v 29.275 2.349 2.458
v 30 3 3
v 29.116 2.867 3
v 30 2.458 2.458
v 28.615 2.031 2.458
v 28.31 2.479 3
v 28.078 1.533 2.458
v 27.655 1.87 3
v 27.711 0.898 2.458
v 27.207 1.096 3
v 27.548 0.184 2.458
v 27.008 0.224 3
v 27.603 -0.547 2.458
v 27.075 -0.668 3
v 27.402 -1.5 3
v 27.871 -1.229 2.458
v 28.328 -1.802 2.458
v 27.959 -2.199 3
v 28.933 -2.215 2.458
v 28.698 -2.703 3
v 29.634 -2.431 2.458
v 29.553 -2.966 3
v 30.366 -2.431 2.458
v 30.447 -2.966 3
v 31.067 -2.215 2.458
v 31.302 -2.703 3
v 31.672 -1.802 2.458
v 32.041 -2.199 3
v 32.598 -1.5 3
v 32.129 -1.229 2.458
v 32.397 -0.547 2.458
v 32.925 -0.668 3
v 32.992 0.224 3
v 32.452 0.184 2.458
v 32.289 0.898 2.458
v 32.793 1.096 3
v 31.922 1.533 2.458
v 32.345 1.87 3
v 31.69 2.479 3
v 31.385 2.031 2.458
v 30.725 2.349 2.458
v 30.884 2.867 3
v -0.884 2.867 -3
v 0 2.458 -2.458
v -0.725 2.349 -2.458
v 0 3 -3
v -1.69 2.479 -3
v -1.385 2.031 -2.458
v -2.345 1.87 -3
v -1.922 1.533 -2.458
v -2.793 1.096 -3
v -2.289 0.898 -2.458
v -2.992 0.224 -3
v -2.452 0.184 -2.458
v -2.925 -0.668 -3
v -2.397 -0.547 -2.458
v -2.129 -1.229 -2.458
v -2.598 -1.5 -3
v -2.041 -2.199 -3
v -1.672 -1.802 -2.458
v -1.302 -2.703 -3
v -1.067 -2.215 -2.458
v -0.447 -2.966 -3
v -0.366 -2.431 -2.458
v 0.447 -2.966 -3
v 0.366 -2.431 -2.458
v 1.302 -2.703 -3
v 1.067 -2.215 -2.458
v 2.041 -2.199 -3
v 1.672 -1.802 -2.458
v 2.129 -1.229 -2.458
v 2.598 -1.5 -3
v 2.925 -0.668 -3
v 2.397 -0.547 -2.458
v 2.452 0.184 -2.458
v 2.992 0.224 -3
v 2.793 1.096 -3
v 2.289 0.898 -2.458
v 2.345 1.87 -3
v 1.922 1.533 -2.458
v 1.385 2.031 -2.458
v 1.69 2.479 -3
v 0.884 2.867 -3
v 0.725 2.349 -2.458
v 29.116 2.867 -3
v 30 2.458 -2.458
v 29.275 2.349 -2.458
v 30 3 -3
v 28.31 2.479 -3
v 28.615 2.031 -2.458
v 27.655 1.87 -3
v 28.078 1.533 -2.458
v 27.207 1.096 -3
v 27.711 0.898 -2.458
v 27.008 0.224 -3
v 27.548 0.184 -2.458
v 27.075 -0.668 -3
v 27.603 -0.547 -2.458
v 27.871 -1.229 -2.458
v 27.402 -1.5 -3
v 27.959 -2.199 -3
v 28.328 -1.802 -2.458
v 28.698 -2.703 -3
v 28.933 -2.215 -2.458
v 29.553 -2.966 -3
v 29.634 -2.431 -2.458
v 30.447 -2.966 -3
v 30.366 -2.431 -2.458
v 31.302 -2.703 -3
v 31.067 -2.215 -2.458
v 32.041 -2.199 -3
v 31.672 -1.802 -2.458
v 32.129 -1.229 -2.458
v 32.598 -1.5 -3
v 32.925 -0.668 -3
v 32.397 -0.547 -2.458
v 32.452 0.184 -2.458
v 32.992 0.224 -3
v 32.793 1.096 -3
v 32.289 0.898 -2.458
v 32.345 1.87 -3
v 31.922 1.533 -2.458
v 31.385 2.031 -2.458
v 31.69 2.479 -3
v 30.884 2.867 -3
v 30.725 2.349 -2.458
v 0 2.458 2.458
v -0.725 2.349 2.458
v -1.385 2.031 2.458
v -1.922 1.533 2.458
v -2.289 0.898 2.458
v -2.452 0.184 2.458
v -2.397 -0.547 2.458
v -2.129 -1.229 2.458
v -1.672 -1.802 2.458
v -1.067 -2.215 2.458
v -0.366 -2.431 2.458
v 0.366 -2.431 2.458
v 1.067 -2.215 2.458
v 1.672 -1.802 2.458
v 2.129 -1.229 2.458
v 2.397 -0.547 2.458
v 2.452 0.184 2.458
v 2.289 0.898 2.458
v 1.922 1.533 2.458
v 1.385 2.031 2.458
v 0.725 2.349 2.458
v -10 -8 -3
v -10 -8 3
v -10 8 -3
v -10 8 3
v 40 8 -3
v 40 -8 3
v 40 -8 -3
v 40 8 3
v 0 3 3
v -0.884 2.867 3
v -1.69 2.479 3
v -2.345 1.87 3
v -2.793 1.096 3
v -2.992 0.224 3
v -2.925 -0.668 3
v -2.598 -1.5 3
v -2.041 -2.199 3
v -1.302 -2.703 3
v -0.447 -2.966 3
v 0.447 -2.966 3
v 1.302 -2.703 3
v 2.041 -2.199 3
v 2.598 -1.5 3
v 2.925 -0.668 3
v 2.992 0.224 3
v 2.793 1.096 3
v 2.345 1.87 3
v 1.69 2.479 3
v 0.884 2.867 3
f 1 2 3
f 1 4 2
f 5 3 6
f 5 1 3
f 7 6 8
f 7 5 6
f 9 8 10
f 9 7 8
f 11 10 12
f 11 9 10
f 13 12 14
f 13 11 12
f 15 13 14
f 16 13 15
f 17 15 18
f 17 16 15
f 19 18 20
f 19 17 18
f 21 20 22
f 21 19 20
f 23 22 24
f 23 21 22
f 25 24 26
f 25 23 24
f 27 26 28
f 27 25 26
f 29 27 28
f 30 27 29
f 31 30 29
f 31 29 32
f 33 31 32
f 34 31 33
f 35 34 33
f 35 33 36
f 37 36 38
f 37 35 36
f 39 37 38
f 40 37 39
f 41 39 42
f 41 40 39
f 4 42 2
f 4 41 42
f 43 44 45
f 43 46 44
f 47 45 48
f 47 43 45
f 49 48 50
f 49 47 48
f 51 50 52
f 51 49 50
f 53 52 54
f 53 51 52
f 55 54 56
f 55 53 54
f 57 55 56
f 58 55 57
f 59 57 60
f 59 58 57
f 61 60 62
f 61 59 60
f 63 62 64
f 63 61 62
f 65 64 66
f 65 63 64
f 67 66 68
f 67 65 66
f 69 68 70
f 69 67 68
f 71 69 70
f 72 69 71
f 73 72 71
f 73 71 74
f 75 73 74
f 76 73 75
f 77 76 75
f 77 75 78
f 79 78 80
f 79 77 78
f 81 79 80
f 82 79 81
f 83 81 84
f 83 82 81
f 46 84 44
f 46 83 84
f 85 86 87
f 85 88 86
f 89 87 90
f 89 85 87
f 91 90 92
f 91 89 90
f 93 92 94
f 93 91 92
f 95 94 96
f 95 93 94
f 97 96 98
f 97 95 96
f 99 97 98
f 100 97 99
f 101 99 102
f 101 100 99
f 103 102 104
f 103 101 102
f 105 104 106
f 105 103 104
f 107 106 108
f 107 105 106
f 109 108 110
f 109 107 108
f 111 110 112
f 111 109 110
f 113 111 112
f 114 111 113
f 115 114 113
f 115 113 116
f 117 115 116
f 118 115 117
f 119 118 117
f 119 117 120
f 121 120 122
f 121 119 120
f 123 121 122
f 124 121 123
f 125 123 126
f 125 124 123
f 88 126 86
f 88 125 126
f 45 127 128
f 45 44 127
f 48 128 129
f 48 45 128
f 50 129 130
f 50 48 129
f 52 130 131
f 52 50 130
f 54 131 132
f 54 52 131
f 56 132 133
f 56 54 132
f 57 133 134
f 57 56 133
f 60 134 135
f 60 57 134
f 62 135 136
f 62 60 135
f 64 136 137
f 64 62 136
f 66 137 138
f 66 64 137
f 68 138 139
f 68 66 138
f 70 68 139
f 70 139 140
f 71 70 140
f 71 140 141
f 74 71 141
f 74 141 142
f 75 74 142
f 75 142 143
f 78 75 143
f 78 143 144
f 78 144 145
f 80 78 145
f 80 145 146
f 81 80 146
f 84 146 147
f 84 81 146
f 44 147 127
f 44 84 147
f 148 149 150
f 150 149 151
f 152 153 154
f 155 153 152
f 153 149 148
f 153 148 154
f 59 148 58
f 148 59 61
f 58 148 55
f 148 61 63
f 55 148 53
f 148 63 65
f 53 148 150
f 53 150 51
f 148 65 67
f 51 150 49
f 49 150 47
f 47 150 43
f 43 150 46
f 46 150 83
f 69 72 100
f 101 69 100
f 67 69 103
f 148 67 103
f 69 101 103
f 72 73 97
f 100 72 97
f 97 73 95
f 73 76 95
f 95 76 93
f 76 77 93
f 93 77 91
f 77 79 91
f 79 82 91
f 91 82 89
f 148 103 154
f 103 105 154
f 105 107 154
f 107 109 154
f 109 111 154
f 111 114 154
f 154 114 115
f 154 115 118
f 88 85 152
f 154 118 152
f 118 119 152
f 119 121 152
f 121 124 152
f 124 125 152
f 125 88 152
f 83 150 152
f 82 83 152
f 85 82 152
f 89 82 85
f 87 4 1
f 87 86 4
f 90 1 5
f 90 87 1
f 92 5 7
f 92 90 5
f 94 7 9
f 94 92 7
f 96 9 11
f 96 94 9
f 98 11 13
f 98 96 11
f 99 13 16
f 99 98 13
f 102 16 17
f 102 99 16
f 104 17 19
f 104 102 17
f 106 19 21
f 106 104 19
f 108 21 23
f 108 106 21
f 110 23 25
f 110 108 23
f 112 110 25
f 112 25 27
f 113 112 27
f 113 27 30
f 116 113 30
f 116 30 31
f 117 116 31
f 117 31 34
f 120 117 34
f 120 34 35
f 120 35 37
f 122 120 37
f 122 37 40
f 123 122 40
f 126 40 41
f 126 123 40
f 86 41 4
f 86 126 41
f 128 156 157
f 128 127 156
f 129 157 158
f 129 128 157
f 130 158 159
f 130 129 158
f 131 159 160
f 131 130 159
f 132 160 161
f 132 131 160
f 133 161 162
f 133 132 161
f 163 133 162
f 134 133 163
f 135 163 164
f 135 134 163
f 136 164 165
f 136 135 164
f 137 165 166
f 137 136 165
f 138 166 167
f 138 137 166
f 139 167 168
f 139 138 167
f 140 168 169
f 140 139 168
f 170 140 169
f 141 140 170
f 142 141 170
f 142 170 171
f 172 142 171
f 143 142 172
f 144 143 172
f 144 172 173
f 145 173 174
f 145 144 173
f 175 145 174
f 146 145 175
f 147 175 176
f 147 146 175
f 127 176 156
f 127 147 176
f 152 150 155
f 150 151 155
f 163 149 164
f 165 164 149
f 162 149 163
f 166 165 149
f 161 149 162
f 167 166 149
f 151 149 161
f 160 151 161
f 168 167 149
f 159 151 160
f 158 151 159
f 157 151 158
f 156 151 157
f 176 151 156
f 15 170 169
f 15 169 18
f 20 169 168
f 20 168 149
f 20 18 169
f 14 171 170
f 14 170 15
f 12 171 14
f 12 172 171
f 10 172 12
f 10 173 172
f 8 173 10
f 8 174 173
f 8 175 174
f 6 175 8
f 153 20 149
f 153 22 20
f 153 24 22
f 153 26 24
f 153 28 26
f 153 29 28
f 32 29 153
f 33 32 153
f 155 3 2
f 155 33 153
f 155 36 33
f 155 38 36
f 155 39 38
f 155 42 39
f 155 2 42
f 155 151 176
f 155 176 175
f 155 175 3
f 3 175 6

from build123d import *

# Parameters (mm, degrees)
BOSS_EXTRUDE1_DEPTH      = 3
BOSS_EXTRUDE1_DEPTH_BACK = 3
SKETCH1_W                = 50
SKETCH1_H                = 16


with BuildPart() as part:
    # Sketch1 → Boss-Extrude1 (new, two sides: drawn at the far end of the back side and taken through both)
    with BuildSketch(Plane.XY.offset(-BOSS_EXTRUDE1_DEPTH_BACK)):
        with Locations((15, 0)):
            Rectangle(SKETCH1_W, SKETCH1_H)
    extrude(amount=BOSS_EXTRUDE1_DEPTH + BOSS_EXTRUDE1_DEPTH_BACK)

    # Sketch2 → Cut-Revolve1 (revolve, cut)
    with BuildSketch(Plane(origin=(0, 0, 0), x_dir=(0, 0, -1), z_dir=(1, 0, 0))):
        Polygon((-3, 0), (-3, 3), (-2.4585, 2.4585), (2.4585, 2.4585), (3, 3), (3, 0), align=None)
    revolve(axis=Axis((0, 0, -3), (0, 0, 1)), mode=Mode.SUBTRACT)

    # Sketch3 → Cut-Revolve2 (revolve, cut)
    with BuildSketch(Plane(origin=(30, 0, 0), x_dir=(0, 0, -1), z_dir=(1, 0, 0))):
        Polygon((-3, 0), (-3, 3), (-2.4585, 2.4585), (2.4585, 2.4585), (3, 3), (3, 0), align=None)
    revolve(axis=Axis((30, 0, -3), (0, 0, 1)), mode=Mode.SUBTRACT)


solid = part.part
